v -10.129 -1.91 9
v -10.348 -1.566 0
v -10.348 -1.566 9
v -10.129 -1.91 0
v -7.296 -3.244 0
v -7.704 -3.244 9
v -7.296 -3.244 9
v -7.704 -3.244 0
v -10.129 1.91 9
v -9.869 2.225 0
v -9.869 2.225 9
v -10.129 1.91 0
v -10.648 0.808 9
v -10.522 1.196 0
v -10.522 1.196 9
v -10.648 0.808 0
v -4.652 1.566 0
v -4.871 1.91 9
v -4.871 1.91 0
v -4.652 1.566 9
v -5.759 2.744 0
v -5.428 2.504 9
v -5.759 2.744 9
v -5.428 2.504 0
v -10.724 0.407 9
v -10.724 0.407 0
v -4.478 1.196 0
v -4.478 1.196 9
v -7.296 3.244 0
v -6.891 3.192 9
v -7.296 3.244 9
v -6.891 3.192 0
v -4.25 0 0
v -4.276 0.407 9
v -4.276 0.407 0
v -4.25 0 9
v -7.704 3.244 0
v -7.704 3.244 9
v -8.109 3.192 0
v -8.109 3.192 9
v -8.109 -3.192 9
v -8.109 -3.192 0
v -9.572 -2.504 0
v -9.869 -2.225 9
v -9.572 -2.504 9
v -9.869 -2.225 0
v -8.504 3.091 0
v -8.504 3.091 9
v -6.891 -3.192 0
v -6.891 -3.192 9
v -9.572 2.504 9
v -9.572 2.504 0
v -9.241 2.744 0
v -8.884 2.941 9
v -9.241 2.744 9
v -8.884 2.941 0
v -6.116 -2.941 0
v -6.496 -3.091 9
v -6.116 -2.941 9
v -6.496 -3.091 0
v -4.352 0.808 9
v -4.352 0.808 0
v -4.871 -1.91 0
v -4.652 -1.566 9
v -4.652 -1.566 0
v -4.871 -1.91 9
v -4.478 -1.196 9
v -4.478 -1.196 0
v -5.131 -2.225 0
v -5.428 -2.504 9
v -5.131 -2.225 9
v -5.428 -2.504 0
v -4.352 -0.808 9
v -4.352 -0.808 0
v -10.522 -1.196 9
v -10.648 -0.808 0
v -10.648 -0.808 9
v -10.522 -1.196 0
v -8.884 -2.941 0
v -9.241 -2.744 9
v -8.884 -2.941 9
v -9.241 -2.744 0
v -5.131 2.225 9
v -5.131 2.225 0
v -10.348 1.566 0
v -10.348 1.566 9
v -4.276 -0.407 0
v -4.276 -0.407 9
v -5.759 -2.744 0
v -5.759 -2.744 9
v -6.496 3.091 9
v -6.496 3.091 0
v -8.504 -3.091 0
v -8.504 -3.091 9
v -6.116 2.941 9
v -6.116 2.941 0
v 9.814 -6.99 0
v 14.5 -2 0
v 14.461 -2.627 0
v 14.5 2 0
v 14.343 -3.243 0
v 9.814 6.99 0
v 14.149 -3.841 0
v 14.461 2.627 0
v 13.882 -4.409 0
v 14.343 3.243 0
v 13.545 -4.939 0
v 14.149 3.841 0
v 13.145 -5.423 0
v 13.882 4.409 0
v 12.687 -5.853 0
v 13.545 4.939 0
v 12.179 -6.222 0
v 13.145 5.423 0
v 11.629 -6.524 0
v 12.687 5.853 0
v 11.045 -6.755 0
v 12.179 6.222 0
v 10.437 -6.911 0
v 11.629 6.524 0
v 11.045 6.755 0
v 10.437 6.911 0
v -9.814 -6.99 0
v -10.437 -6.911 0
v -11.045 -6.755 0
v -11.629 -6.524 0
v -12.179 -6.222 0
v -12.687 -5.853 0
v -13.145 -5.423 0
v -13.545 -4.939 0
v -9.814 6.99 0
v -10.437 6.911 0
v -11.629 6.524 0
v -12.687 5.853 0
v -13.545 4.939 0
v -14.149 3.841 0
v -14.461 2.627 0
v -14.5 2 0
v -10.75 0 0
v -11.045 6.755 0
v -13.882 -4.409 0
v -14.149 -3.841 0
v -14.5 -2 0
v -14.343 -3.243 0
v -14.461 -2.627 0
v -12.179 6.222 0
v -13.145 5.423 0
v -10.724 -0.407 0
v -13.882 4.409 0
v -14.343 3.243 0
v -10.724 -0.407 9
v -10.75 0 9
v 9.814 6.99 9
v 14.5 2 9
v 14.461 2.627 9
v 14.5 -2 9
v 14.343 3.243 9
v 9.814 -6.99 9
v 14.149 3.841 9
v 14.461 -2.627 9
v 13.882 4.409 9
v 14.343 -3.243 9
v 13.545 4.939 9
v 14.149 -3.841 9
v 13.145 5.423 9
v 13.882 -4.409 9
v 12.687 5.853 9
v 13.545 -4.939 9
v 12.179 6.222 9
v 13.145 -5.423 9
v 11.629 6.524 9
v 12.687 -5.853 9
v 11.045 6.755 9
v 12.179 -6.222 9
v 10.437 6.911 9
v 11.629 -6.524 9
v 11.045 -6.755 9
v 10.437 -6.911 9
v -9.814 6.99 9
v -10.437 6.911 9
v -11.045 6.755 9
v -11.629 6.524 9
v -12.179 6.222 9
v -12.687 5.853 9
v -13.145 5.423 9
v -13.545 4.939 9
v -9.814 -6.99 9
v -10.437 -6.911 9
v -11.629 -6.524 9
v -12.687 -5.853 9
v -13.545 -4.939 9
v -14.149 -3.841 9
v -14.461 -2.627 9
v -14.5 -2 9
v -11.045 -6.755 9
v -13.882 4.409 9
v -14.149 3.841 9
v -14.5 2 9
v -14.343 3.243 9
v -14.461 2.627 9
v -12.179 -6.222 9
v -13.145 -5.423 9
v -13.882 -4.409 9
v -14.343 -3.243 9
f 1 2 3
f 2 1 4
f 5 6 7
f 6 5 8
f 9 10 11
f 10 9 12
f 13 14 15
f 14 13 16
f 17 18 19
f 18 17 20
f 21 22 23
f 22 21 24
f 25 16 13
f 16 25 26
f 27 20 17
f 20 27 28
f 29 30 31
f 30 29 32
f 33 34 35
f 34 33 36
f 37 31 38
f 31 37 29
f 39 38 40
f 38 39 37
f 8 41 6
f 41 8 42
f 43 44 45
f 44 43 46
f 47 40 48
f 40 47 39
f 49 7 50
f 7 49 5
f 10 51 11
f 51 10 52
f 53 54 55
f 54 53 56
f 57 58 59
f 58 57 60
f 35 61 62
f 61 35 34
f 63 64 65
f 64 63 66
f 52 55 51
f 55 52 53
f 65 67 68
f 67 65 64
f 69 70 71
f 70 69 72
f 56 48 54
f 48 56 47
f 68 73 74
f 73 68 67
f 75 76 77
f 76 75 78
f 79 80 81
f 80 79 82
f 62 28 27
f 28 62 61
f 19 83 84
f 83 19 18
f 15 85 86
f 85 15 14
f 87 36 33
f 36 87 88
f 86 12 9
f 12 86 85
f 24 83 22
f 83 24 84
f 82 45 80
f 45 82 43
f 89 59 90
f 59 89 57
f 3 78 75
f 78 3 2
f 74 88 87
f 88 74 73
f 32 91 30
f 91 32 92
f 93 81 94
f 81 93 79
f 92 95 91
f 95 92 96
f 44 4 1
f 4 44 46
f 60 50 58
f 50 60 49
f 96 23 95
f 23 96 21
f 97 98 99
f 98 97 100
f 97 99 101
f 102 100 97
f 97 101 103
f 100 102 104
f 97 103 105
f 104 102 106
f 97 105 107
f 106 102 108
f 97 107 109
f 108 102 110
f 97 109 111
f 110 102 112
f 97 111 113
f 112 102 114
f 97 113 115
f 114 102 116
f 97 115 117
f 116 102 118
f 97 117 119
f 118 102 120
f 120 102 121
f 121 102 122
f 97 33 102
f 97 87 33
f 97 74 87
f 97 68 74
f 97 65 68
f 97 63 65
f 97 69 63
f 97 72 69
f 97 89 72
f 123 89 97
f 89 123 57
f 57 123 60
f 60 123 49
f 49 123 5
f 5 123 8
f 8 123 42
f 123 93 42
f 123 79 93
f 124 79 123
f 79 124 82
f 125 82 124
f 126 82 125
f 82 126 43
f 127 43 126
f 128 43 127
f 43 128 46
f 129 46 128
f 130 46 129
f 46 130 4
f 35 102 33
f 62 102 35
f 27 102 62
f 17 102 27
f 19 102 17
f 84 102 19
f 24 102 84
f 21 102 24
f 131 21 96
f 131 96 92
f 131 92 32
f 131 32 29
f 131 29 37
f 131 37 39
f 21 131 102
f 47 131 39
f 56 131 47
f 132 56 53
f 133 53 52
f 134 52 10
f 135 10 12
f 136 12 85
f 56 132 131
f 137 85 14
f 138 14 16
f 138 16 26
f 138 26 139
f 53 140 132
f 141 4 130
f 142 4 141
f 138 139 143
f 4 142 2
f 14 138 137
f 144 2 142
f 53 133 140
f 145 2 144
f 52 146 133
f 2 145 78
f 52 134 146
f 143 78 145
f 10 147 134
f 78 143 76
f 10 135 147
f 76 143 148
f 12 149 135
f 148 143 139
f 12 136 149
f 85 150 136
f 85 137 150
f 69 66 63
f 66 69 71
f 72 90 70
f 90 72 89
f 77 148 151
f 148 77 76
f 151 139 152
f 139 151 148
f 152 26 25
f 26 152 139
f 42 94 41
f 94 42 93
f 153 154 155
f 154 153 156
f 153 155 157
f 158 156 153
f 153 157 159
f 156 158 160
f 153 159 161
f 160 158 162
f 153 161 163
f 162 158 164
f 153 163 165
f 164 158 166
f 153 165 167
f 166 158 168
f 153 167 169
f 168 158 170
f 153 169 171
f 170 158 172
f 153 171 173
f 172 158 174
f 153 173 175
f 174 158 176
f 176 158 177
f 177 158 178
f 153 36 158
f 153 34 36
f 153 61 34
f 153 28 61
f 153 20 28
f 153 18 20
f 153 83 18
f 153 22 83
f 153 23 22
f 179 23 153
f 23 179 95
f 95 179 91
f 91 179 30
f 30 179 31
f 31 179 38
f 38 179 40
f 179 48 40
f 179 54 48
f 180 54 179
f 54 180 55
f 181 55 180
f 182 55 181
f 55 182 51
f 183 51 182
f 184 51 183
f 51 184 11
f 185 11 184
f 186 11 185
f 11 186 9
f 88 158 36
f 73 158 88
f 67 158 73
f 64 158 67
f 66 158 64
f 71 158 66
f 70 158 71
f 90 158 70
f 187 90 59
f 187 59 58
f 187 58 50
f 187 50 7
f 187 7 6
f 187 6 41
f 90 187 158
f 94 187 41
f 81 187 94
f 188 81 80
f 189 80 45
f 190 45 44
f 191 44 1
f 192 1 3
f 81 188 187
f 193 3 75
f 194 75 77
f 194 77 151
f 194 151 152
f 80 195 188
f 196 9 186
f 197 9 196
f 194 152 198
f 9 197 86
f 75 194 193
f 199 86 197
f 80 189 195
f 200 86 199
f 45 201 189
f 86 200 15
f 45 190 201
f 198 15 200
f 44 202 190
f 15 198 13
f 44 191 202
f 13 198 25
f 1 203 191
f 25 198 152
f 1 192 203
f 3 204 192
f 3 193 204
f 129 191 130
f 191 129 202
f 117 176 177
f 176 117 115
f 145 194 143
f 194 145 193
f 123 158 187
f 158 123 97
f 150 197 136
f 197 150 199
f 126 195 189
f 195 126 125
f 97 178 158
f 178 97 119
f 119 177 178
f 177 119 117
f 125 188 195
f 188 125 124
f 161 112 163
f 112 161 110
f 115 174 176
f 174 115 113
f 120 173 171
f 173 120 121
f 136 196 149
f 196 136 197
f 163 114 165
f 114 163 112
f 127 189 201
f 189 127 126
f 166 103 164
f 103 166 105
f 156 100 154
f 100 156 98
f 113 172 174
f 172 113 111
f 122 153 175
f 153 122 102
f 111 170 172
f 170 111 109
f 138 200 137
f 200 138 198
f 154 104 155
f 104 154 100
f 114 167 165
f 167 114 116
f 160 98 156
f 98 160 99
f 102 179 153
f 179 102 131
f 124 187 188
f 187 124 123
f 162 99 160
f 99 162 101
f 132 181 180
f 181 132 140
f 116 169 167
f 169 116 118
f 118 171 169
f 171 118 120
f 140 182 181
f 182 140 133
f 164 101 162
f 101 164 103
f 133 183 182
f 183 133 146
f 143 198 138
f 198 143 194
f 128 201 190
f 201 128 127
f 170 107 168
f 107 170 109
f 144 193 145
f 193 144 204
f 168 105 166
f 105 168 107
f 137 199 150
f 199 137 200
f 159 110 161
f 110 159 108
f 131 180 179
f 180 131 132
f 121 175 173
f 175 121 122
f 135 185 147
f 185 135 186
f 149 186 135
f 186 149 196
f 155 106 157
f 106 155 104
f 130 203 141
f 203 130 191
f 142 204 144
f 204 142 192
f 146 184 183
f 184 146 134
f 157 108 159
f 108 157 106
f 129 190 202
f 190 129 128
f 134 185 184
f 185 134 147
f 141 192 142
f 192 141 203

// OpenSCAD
$fn = 50;


difference() {
	union() {
		hull() {
			translate(v = [-9.5000000000, 2.0000000000, 0]) {
				cylinder(h = 9, r = 5);
			}
			translate(v = [9.5000000000, 2.0000000000, 0]) {
				cylinder(h = 9, r = 5);
			}
			translate(v = [-9.5000000000, -2.0000000000, 0]) {
				cylinder(h = 9, r = 5);
			}
			translate(v = [9.5000000000, -2.0000000000, 0]) {
				cylinder(h = 9, r = 5);
			}
		}
	}
	union() {
		translate(v = [-7.5000000000, 0.0000000000, 0]) {
			cylinder(h = 9, r = 3.2500000000);
		}
		translate(v = [-7.5000000000, 0.0000000000, 0]) {
			cylinder(h = 9, r = 1.8000000000);
		}
		translate(v = [-7.5000000000, 0.0000000000, 0]) {
			cylinder(h = 9, r = 1.8000000000);
		}
		translate(v = [-7.5000000000, 0.0000000000, 0]) {
			cylinder(h = 9, r = 1.8000000000);
		}
	}
}
